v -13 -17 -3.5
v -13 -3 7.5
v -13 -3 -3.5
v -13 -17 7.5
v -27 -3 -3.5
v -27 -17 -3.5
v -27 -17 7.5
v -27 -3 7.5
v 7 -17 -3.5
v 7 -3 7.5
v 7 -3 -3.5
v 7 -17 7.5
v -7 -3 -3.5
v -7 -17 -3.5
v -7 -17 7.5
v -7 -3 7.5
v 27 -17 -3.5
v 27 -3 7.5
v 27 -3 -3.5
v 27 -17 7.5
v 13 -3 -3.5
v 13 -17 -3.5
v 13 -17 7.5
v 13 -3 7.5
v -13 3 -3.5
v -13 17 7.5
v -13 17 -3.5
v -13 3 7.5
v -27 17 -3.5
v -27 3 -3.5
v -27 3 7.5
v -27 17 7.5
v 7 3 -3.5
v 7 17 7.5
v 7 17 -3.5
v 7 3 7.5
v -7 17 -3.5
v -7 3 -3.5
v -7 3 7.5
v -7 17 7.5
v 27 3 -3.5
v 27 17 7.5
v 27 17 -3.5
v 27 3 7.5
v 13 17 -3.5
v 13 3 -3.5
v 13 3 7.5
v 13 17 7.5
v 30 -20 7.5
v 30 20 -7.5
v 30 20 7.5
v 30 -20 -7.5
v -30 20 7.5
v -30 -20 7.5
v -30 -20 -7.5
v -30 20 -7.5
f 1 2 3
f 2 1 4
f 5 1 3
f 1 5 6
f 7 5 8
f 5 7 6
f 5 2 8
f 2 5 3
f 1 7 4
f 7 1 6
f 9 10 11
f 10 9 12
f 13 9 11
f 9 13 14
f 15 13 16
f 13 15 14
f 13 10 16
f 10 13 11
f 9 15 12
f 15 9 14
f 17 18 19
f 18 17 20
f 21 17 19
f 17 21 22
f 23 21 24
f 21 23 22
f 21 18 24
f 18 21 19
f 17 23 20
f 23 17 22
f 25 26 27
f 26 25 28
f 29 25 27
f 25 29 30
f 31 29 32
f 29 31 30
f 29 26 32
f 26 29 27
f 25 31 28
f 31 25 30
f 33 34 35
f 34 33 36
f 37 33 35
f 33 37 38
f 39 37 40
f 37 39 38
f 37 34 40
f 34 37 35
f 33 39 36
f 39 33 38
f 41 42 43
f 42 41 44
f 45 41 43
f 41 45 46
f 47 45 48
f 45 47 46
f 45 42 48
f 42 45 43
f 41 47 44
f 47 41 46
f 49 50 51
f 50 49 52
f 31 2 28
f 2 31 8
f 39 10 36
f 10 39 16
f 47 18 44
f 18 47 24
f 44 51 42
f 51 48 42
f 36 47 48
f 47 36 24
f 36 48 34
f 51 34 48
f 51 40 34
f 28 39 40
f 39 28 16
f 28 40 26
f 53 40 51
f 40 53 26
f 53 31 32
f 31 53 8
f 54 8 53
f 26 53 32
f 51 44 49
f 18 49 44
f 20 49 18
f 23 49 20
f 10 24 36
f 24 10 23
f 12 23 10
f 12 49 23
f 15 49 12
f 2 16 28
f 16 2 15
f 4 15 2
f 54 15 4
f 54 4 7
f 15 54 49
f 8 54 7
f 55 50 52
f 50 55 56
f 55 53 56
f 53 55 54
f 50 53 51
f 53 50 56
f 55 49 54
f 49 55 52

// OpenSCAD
$fn = 32;

// ----------------------------------------------------------------------
// Pocket plate 60 x 40 x 15
// 2 x 3 pockets 14 mm square, 11 mm deep
// ----------------------------------------------------------------------

// --- parameters (mm) ---
thickness = 15;  // plate thickness
floor_t = 4;     // material left under each pocket
pocket = 14;     // pocket side length
pitch_x = 20;    // pocket pitch along X
pitch_y = 20;    // pocket pitch along Y
cols = 3;        // pockets per row
rows = 2;        // rows of pockets

// --- derived feature positions (mm) ---
depth = thickness - floor_t;        // = 11   pocket depth, down to the floor
span_x = (cols - 1) * pitch_x;      // = 40   distance between outer pockets
span_y = (rows - 1) * pitch_y;      // = 20   distance between outer pocket rows
origin_x = -span_x / 2;             // = -20   X of the first pocket
origin_y = -span_y / 2;             // = -10   Y of the first pocket
plate = [span_x + pocket + 6, span_y + pocket + 6, thickness];  // = [60, 40, 15]   overall size: pockets plus 3 mm of wall on each side
feature_centers = [
  [origin_x + 0 * pitch_x, origin_y + 0 * pitch_y],
  [origin_x + 1 * pitch_x, origin_y + 0 * pitch_y],
  [origin_x + 2 * pitch_x, origin_y + 0 * pitch_y],
  [origin_x + 0 * pitch_x, origin_y + 1 * pitch_y],
  [origin_x + 1 * pitch_x, origin_y + 1 * pitch_y],
  [origin_x + 2 * pitch_x, origin_y + 1 * pitch_y]
];   // pocket centres, used verbatim by the cutter loop

// plate outline, then one pocket per centre in feature_centers
difference() {
  cube(plate, center = true);
  for (centre = feature_centers)
    translate([centre[0] - pocket / 2, centre[1] - pocket / 2, plate[2] / 2 - depth])
      cube([pocket, pocket, depth + 1]);  // centred on the declared pocket centre
}
